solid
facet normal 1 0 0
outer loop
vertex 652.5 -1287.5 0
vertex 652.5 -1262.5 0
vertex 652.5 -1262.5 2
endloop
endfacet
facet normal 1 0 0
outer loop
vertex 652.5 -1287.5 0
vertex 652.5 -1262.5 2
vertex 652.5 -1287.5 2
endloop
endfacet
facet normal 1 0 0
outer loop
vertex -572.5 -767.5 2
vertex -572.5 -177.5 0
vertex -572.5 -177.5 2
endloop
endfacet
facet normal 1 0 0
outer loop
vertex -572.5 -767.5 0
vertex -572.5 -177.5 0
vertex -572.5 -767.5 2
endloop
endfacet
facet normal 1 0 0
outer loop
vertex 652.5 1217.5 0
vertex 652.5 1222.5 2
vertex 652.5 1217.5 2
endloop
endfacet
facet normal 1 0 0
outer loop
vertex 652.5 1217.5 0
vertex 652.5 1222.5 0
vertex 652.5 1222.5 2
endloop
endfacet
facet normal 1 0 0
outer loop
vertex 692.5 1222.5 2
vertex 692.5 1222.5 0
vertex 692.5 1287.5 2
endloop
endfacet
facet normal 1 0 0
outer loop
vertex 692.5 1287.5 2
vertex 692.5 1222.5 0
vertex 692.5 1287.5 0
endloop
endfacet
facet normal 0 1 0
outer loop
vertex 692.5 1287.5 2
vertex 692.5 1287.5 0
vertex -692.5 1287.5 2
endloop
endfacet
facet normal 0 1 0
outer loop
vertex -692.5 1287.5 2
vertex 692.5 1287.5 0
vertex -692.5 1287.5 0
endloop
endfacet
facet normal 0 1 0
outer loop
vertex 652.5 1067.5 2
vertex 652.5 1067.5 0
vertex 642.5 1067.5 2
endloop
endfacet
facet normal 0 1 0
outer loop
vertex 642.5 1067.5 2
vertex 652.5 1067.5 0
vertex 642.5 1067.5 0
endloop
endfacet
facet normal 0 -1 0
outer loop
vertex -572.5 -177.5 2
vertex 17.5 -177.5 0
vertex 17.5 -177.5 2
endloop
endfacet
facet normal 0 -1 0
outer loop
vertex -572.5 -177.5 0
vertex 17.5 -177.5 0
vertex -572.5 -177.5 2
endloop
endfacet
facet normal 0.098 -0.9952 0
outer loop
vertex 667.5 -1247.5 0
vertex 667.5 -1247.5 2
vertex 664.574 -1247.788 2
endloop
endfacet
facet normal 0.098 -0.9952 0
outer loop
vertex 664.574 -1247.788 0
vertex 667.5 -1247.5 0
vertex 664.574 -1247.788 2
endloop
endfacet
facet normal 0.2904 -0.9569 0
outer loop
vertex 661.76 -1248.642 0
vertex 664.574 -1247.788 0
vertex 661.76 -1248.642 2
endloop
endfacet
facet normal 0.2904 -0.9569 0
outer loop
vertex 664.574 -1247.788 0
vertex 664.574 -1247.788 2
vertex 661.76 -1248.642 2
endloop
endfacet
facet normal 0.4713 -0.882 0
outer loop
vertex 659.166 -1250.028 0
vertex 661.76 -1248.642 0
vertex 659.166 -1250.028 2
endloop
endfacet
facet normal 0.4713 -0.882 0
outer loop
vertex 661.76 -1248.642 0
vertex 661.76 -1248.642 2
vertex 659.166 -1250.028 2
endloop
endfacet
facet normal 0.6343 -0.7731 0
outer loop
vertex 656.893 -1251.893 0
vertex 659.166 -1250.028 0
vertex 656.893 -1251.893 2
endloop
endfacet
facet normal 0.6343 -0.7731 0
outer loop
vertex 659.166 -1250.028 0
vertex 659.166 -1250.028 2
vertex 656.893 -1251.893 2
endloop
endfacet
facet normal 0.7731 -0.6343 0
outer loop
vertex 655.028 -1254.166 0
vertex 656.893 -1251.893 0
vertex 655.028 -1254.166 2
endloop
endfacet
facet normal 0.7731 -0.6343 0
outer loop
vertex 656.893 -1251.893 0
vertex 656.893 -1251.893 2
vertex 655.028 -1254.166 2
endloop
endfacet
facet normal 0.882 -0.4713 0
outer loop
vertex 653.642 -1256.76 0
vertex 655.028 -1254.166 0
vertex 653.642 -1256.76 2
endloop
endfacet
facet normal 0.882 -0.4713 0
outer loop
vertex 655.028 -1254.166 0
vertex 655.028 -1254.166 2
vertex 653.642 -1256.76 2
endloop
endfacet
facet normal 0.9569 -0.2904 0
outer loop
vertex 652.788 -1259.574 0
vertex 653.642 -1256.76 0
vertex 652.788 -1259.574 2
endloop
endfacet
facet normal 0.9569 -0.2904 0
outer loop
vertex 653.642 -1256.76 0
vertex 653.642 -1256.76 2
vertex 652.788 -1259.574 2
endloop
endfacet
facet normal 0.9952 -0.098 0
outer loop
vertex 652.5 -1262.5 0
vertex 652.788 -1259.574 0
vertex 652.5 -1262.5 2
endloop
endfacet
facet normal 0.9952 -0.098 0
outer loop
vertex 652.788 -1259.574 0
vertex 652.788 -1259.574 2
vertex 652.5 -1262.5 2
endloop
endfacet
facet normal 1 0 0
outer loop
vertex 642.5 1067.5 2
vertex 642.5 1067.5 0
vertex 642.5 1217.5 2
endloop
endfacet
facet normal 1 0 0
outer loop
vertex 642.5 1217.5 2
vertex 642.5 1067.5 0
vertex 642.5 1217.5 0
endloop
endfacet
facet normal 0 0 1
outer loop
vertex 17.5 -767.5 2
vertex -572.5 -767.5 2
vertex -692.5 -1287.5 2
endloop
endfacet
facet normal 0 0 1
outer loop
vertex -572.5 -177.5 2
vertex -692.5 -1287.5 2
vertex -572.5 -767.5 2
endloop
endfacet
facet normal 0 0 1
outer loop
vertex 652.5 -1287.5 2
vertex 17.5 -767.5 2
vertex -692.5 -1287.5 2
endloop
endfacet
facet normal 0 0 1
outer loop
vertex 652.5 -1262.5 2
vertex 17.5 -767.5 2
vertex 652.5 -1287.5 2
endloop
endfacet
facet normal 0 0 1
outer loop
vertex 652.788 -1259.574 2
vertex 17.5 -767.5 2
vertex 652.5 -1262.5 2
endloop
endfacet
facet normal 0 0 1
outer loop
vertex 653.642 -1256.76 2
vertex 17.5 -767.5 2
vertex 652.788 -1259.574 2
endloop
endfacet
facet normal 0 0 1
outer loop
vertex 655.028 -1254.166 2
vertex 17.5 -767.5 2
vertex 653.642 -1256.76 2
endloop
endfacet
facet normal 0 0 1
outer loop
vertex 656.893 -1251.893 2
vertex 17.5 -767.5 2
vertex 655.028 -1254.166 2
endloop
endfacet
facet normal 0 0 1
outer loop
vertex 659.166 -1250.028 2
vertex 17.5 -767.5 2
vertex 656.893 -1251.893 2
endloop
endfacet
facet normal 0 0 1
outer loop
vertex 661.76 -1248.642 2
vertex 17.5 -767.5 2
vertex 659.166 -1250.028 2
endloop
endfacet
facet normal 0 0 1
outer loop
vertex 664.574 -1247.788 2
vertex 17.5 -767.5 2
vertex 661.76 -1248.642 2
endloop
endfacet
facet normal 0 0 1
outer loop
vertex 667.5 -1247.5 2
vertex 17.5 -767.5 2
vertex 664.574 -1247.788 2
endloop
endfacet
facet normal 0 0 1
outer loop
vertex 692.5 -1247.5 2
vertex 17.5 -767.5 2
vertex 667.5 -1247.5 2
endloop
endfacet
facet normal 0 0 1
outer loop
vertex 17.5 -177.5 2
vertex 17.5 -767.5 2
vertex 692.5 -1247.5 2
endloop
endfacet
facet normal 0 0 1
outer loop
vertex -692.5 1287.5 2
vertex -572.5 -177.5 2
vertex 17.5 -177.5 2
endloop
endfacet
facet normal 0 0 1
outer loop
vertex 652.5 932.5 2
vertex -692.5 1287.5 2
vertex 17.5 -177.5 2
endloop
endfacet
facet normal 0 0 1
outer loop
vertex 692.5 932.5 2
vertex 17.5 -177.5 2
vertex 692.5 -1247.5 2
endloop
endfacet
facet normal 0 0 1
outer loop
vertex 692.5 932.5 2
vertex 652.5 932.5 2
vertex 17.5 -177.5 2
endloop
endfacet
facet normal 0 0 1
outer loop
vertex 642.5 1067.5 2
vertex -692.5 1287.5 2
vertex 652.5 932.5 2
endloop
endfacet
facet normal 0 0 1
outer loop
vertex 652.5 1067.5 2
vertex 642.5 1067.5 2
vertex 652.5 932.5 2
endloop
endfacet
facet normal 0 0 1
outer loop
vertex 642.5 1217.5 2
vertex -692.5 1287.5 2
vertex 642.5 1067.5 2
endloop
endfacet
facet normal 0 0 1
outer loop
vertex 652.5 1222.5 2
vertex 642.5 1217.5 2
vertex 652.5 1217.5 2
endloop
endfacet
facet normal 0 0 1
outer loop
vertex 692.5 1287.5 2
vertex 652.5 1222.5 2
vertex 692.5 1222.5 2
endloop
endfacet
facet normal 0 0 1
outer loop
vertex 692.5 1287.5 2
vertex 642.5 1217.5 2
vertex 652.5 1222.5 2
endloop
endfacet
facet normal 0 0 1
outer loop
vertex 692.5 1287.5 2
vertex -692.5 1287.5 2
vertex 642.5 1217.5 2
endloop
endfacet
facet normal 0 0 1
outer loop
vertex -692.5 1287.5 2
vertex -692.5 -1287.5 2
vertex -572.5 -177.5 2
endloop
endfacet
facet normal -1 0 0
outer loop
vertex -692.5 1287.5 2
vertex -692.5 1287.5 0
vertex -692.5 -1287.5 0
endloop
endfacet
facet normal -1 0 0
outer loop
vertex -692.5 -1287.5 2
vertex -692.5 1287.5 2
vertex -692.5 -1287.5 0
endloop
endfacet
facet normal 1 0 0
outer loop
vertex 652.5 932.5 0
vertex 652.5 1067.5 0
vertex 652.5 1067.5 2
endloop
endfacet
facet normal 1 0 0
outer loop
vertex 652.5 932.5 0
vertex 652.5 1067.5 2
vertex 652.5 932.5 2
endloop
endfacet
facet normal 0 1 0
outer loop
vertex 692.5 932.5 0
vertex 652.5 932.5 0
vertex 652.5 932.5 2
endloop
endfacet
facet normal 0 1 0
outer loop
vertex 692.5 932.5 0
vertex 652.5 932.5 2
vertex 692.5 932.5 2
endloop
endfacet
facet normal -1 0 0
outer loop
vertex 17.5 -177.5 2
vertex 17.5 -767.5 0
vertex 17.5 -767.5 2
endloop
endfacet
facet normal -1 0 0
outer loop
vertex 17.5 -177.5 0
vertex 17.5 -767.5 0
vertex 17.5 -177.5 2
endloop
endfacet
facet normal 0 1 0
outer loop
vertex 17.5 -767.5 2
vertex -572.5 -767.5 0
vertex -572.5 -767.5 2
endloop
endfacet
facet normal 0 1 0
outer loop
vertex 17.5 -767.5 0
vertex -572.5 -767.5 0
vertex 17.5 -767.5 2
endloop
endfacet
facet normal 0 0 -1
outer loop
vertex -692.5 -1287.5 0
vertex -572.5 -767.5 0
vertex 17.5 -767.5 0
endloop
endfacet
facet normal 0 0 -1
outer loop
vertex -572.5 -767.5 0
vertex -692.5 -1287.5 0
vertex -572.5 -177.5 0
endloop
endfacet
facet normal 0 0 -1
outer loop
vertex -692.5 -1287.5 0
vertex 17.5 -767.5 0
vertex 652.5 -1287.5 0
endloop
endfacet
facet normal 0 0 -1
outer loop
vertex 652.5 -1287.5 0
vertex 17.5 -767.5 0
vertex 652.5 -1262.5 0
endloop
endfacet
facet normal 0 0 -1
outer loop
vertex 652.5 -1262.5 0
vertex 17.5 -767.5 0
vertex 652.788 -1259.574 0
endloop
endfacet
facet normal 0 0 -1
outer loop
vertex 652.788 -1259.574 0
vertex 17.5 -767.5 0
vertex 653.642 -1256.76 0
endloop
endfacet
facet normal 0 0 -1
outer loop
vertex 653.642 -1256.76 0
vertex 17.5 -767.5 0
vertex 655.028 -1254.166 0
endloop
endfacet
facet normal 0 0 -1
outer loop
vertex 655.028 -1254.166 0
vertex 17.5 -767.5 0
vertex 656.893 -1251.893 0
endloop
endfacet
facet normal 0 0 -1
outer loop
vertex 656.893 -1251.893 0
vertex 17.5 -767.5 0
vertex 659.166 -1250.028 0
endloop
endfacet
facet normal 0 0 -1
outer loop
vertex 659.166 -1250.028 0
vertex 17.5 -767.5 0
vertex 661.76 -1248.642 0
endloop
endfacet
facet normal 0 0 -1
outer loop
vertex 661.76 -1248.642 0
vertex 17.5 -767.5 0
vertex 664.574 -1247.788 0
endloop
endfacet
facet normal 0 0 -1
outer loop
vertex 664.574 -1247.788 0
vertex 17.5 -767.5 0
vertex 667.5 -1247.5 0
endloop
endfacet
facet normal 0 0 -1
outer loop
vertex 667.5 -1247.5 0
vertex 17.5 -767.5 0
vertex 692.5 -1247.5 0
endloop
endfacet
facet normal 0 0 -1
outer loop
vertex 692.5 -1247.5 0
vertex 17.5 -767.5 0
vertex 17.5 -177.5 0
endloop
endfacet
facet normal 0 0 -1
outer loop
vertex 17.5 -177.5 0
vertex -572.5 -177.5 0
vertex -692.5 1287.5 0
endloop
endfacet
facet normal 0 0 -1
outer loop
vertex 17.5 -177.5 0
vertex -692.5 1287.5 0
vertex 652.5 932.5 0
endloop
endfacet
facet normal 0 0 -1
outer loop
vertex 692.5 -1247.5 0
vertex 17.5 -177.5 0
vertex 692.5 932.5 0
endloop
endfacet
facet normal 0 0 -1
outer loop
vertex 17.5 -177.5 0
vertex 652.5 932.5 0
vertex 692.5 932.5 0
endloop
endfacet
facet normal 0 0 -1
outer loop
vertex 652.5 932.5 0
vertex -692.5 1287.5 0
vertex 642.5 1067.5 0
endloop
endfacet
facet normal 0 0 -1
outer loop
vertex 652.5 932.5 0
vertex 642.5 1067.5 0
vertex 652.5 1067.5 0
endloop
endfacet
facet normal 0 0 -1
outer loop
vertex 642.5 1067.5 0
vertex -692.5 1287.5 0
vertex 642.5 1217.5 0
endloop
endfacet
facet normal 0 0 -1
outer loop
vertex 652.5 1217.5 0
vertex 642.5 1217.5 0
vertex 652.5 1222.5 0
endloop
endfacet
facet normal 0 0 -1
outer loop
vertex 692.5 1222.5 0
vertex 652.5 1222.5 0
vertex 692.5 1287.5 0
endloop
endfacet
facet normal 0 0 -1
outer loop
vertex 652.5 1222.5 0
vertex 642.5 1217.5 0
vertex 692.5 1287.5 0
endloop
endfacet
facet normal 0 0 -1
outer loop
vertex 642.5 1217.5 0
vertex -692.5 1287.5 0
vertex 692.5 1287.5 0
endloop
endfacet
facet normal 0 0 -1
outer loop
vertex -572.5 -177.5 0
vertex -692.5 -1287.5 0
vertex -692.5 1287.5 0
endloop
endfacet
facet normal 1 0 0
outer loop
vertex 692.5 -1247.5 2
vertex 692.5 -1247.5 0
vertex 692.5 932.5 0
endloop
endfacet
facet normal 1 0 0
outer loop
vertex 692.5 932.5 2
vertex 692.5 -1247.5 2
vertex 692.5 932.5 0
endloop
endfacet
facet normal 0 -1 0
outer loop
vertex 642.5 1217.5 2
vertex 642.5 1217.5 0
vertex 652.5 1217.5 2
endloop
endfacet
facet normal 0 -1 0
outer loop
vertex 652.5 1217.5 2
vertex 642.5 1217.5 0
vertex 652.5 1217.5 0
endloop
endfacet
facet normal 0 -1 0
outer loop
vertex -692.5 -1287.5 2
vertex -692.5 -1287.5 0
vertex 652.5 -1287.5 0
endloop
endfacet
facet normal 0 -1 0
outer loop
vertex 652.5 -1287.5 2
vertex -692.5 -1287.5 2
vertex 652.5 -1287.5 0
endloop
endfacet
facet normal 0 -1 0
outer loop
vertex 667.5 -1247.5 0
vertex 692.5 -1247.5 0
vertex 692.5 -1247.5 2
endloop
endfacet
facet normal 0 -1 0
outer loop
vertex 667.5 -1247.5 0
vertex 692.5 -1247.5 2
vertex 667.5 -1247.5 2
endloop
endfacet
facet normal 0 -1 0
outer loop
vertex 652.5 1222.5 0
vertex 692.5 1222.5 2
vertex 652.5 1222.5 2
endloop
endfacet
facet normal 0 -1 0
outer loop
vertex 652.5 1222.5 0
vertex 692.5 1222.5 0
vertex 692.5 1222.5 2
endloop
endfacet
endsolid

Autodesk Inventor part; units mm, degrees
ref_plane "YZ Plane" through (0, 0, 0) normal (1, 0, 0) x (0, 1, 0)
ref_plane "XZ Plane" through (0, 0, 0) normal (0, 1, 0) x (-1, 0, 0)
ref_plane "XY Plane" through (0, 0, 0) normal (0, 0, 1) x (1, 0, 0)
sketch "Sketch1" plane through (0, 0, 0) normal (0, 0, 1) x (1, 0, 0)
  line L0 (-692.5, -1287.5) -> (692.5, -1287.5)
  line L1 (692.5, -1287.5) -> (692.5, 1287.5)
  line L2 (692.5, 1287.5) -> (-692.5, 1287.5)
  line L3 (-692.5, 1287.5) -> (-692.5, -1287.5)
  line L4 (-692.5, -1287.5) -> (692.5, 1287.5) construction
  line L5 (692.5, -1287.5) -> (-692.5, 1287.5) construction
  line L6 (692.5, -1247.5) -> (652.5, -1247.5)
  line L7 (652.5, -1247.5) -> (652.5, -1287.5)
  line L8 (692.5, 1222.5) -> (652.5, 1222.5)
  line L9 (652.5, 1222.5) -> (652.5, 932.5)
  line L10 (652.5, 932.5) -> (692.5, 932.5)
  line L11 (692.5, 932.5) -> (692.5, 1222.5)
  line L12 (652.5, 1067.5) -> (642.5, 1067.5)
  line L13 (642.5, 1067.5) -> (642.5, 1217.5)
  line L14 (642.5, 1217.5) -> (652.5, 1217.5)
  line L15 (-572.5, -767.5) -> (17.5, -767.5)
  line L16 (17.5, -767.5) -> (17.5, -177.5)
  line L17 (17.5, -177.5) -> (-572.5, -177.5)
  line L18 (-572.5, -177.5) -> (-572.5, -767.5)
  point P0 (0, 0)
  dimension "d154" = 1385
  dimension "d155" = 2575
  dimension "d157" = 40
  dimension "d159" = 290
  dimension "d161" = 40
  dimension "d162" = 2220
  dimension "d163" = 10
  dimension "d164" = 150
  dimension "d165" = 5
  dimension "d166" = 590
  dimension "d167" = 590
  dimension "d168" = 675
  dimension "d169" = 520
extrude "Plate5" add sketch "Sketch1" along normal blind 2 contours L3 L2 L1 L8 L9 L14 L13 L12 L10 L6 L7 L0
fillet "Corner Round1" radius 15 1 edges at (652.5, -1247.5, 1)
properties part number "PNS-0111 floor sheet 2" material "Stainless Steel"
